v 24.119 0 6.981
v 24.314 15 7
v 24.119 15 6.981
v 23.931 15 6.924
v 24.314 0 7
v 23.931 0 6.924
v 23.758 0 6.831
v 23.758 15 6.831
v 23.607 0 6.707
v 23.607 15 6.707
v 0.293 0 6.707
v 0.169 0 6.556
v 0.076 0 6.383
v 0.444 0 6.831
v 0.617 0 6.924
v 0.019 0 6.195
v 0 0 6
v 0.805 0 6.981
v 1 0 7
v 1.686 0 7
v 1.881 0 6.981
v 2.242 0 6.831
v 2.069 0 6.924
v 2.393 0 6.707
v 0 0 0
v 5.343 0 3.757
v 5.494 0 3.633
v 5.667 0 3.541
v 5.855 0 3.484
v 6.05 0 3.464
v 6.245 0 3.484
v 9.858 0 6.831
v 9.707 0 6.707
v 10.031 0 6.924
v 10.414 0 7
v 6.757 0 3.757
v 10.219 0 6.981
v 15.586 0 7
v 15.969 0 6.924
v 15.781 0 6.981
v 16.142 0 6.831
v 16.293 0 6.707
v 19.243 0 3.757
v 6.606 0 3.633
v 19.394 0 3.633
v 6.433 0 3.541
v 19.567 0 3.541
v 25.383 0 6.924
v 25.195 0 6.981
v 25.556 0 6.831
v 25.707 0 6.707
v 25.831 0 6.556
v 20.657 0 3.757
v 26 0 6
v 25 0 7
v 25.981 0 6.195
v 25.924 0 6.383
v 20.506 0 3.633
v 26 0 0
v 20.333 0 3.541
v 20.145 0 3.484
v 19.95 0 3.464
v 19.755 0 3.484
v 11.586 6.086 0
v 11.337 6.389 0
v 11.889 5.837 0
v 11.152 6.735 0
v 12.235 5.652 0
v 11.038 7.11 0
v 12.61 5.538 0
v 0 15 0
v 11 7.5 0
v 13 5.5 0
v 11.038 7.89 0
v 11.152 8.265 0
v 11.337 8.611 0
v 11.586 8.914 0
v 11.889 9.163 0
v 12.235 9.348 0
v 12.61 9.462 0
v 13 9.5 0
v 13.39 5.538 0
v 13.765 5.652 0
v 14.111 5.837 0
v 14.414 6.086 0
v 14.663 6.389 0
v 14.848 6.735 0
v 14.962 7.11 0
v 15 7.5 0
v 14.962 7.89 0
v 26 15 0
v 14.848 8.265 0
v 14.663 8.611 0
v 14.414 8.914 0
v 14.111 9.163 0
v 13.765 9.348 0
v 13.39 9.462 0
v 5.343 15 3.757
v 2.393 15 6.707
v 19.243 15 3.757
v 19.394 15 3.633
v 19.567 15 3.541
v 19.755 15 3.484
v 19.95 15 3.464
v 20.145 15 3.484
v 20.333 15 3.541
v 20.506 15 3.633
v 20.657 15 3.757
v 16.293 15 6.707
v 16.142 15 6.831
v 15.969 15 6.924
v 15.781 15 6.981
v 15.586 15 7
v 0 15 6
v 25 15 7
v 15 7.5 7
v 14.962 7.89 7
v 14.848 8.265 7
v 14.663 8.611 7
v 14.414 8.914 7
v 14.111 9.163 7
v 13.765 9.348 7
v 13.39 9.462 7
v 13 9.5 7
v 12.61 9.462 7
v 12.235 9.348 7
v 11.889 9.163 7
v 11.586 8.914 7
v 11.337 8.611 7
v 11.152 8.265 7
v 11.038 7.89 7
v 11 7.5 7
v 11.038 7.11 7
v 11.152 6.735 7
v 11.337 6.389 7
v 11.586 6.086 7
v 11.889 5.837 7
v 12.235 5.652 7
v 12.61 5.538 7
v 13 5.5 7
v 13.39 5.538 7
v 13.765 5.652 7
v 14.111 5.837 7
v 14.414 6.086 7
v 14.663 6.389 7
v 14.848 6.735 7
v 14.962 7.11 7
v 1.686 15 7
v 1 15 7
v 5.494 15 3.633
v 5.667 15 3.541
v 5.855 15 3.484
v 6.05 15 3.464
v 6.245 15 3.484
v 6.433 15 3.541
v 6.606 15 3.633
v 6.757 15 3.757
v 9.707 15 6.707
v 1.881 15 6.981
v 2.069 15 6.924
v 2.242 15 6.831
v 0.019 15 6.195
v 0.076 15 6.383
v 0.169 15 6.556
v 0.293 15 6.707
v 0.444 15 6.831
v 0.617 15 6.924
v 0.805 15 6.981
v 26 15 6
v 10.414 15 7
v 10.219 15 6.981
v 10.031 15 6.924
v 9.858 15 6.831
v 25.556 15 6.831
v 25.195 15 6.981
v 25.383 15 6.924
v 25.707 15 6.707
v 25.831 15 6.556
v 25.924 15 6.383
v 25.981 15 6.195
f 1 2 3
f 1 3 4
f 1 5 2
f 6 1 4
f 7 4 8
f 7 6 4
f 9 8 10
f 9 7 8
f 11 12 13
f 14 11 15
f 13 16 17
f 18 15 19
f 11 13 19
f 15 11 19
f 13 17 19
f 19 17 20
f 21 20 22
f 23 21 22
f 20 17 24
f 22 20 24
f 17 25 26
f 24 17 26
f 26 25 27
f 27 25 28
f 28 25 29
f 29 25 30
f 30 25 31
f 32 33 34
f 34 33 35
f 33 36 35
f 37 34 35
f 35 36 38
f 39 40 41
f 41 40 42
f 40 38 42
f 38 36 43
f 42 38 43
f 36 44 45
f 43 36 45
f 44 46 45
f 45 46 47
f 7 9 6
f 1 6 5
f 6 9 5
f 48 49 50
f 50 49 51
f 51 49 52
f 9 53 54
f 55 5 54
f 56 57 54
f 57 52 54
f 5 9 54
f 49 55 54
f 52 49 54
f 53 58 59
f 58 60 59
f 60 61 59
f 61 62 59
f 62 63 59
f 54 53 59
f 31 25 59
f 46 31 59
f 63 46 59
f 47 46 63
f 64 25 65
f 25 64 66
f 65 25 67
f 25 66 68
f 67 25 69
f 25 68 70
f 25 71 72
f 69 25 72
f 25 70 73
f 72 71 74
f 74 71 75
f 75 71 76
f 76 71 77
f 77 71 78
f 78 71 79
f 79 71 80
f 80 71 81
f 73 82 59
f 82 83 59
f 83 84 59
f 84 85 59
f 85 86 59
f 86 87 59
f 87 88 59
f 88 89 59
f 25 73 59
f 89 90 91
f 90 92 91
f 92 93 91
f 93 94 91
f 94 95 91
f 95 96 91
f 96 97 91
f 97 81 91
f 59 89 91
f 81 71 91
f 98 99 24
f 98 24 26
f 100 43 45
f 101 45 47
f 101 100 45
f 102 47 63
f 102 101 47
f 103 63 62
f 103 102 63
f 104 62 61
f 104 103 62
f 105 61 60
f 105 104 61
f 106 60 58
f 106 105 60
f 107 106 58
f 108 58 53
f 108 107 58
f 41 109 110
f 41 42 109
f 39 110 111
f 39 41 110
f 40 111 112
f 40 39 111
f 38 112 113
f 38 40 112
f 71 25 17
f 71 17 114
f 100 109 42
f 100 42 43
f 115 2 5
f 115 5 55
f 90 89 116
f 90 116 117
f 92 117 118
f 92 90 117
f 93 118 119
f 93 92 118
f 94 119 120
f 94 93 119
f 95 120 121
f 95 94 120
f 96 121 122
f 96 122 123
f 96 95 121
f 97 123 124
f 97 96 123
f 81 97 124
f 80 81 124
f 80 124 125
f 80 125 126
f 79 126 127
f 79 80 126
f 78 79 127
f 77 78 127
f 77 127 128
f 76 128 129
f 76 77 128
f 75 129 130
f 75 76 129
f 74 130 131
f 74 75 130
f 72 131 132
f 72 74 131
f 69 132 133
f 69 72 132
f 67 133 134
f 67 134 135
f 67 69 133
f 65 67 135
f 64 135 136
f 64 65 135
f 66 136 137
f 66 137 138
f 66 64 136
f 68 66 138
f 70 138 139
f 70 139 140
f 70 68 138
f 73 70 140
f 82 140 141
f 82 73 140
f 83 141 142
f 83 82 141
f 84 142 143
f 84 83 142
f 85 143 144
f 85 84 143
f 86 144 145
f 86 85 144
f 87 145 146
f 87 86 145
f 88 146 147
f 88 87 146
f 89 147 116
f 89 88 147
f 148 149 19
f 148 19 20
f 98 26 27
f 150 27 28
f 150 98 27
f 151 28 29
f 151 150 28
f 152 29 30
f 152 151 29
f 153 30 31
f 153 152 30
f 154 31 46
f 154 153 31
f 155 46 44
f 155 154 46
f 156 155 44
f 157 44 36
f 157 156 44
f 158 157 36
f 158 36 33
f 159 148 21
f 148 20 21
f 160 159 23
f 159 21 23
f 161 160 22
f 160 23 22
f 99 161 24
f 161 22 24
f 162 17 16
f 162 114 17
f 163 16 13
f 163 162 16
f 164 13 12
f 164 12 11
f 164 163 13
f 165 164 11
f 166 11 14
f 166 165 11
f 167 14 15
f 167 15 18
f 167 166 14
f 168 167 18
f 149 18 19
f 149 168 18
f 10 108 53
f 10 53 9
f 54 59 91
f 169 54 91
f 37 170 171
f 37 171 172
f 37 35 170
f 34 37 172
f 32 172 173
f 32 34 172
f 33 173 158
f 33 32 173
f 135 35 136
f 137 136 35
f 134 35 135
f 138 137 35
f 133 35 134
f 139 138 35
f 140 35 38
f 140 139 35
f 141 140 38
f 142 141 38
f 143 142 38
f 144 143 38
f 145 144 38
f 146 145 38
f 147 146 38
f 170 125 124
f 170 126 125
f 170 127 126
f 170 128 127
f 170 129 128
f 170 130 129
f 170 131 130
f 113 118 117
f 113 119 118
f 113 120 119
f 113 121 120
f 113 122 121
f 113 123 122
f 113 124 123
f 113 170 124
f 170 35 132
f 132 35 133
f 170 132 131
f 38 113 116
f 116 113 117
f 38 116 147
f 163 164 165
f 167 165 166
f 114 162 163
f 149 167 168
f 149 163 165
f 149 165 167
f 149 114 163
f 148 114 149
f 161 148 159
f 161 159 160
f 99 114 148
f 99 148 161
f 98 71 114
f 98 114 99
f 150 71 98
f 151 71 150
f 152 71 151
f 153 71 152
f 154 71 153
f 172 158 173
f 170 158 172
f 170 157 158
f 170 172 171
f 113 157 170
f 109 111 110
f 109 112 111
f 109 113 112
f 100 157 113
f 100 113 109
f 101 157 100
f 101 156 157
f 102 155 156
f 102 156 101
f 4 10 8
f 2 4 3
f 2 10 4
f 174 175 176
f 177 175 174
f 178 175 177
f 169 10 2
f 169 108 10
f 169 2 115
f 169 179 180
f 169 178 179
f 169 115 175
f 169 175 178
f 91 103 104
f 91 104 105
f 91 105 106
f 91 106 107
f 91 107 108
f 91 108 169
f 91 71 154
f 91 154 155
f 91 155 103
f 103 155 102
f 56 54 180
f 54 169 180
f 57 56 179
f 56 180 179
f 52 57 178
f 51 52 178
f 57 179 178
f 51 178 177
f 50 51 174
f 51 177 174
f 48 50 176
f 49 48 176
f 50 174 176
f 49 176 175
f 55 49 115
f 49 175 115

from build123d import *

# Parameters (mm, degrees)
SKETCH1_W           = 26
SKETCH1_H           = 15
SKETCH1_R           = 2
BOSS_EXTRUDE1_DEPTH = 7
CUT_EXTRUDE1_DEPTH  = 16
FILLET1_R           = 1


with BuildPart() as part:
    # Sketch1 → Boss-Extrude1 (new body)
    with BuildSketch(Plane.XY):
        with Locations((13, 7.5)):
            Rectangle(SKETCH1_W, SKETCH1_H)
        with Locations((13, 7.5)):
            Circle(SKETCH1_R, mode=Mode.SUBTRACT)
    extrude(amount=BOSS_EXTRUDE1_DEPTH)

    # Sketch2 → Cut-Extrude1 (cut, through all)
    with BuildSketch(Plane(origin=(0, 15, 0), x_dir=(1, 0, 0), z_dir=(0, 1, 0))):
        with BuildLine():
            Line((2.100252532, -7), (5.342893219, -3.757359313))
            ThreePointArc((5.342893219, -3.757359313), (6.05, -3.464466094), (6.757106781, -3.757359313))
            Line((6.757106781, -3.757359313), (9.999747468, -7))
            Line((9.999747468, -7), (2.100252532, -7))
        make_face()
        with BuildLine():
            Line((16.000252532, -7), (19.242893219, -3.757359313))
            ThreePointArc((19.242893219, -3.757359313), (19.95, -3.464466094), (20.657106781, -3.757359313))
            Line((20.657106781, -3.757359313), (23.899747468, -7))
            Line((23.899747468, -7), (16.000252532, -7))
        make_face()
    extrude(amount=-CUT_EXTRUDE1_DEPTH, mode=Mode.SUBTRACT)

    # Fillet1
    fillet1_edges = [part.edges().sort_by_distance(p)[0] for p in [
        (26, 7.5, 7),
        (9.999747468, 7.5, 7),
        (2.100252532, 7.5, 7),
        (23.899747468, 7.5, 7),
        (16.000252532, 7.5, 7),
        (0, 7.5, 7),
    ]]
    fillet(fillet1_edges, radius=FILLET1_R)


solid = part.part
